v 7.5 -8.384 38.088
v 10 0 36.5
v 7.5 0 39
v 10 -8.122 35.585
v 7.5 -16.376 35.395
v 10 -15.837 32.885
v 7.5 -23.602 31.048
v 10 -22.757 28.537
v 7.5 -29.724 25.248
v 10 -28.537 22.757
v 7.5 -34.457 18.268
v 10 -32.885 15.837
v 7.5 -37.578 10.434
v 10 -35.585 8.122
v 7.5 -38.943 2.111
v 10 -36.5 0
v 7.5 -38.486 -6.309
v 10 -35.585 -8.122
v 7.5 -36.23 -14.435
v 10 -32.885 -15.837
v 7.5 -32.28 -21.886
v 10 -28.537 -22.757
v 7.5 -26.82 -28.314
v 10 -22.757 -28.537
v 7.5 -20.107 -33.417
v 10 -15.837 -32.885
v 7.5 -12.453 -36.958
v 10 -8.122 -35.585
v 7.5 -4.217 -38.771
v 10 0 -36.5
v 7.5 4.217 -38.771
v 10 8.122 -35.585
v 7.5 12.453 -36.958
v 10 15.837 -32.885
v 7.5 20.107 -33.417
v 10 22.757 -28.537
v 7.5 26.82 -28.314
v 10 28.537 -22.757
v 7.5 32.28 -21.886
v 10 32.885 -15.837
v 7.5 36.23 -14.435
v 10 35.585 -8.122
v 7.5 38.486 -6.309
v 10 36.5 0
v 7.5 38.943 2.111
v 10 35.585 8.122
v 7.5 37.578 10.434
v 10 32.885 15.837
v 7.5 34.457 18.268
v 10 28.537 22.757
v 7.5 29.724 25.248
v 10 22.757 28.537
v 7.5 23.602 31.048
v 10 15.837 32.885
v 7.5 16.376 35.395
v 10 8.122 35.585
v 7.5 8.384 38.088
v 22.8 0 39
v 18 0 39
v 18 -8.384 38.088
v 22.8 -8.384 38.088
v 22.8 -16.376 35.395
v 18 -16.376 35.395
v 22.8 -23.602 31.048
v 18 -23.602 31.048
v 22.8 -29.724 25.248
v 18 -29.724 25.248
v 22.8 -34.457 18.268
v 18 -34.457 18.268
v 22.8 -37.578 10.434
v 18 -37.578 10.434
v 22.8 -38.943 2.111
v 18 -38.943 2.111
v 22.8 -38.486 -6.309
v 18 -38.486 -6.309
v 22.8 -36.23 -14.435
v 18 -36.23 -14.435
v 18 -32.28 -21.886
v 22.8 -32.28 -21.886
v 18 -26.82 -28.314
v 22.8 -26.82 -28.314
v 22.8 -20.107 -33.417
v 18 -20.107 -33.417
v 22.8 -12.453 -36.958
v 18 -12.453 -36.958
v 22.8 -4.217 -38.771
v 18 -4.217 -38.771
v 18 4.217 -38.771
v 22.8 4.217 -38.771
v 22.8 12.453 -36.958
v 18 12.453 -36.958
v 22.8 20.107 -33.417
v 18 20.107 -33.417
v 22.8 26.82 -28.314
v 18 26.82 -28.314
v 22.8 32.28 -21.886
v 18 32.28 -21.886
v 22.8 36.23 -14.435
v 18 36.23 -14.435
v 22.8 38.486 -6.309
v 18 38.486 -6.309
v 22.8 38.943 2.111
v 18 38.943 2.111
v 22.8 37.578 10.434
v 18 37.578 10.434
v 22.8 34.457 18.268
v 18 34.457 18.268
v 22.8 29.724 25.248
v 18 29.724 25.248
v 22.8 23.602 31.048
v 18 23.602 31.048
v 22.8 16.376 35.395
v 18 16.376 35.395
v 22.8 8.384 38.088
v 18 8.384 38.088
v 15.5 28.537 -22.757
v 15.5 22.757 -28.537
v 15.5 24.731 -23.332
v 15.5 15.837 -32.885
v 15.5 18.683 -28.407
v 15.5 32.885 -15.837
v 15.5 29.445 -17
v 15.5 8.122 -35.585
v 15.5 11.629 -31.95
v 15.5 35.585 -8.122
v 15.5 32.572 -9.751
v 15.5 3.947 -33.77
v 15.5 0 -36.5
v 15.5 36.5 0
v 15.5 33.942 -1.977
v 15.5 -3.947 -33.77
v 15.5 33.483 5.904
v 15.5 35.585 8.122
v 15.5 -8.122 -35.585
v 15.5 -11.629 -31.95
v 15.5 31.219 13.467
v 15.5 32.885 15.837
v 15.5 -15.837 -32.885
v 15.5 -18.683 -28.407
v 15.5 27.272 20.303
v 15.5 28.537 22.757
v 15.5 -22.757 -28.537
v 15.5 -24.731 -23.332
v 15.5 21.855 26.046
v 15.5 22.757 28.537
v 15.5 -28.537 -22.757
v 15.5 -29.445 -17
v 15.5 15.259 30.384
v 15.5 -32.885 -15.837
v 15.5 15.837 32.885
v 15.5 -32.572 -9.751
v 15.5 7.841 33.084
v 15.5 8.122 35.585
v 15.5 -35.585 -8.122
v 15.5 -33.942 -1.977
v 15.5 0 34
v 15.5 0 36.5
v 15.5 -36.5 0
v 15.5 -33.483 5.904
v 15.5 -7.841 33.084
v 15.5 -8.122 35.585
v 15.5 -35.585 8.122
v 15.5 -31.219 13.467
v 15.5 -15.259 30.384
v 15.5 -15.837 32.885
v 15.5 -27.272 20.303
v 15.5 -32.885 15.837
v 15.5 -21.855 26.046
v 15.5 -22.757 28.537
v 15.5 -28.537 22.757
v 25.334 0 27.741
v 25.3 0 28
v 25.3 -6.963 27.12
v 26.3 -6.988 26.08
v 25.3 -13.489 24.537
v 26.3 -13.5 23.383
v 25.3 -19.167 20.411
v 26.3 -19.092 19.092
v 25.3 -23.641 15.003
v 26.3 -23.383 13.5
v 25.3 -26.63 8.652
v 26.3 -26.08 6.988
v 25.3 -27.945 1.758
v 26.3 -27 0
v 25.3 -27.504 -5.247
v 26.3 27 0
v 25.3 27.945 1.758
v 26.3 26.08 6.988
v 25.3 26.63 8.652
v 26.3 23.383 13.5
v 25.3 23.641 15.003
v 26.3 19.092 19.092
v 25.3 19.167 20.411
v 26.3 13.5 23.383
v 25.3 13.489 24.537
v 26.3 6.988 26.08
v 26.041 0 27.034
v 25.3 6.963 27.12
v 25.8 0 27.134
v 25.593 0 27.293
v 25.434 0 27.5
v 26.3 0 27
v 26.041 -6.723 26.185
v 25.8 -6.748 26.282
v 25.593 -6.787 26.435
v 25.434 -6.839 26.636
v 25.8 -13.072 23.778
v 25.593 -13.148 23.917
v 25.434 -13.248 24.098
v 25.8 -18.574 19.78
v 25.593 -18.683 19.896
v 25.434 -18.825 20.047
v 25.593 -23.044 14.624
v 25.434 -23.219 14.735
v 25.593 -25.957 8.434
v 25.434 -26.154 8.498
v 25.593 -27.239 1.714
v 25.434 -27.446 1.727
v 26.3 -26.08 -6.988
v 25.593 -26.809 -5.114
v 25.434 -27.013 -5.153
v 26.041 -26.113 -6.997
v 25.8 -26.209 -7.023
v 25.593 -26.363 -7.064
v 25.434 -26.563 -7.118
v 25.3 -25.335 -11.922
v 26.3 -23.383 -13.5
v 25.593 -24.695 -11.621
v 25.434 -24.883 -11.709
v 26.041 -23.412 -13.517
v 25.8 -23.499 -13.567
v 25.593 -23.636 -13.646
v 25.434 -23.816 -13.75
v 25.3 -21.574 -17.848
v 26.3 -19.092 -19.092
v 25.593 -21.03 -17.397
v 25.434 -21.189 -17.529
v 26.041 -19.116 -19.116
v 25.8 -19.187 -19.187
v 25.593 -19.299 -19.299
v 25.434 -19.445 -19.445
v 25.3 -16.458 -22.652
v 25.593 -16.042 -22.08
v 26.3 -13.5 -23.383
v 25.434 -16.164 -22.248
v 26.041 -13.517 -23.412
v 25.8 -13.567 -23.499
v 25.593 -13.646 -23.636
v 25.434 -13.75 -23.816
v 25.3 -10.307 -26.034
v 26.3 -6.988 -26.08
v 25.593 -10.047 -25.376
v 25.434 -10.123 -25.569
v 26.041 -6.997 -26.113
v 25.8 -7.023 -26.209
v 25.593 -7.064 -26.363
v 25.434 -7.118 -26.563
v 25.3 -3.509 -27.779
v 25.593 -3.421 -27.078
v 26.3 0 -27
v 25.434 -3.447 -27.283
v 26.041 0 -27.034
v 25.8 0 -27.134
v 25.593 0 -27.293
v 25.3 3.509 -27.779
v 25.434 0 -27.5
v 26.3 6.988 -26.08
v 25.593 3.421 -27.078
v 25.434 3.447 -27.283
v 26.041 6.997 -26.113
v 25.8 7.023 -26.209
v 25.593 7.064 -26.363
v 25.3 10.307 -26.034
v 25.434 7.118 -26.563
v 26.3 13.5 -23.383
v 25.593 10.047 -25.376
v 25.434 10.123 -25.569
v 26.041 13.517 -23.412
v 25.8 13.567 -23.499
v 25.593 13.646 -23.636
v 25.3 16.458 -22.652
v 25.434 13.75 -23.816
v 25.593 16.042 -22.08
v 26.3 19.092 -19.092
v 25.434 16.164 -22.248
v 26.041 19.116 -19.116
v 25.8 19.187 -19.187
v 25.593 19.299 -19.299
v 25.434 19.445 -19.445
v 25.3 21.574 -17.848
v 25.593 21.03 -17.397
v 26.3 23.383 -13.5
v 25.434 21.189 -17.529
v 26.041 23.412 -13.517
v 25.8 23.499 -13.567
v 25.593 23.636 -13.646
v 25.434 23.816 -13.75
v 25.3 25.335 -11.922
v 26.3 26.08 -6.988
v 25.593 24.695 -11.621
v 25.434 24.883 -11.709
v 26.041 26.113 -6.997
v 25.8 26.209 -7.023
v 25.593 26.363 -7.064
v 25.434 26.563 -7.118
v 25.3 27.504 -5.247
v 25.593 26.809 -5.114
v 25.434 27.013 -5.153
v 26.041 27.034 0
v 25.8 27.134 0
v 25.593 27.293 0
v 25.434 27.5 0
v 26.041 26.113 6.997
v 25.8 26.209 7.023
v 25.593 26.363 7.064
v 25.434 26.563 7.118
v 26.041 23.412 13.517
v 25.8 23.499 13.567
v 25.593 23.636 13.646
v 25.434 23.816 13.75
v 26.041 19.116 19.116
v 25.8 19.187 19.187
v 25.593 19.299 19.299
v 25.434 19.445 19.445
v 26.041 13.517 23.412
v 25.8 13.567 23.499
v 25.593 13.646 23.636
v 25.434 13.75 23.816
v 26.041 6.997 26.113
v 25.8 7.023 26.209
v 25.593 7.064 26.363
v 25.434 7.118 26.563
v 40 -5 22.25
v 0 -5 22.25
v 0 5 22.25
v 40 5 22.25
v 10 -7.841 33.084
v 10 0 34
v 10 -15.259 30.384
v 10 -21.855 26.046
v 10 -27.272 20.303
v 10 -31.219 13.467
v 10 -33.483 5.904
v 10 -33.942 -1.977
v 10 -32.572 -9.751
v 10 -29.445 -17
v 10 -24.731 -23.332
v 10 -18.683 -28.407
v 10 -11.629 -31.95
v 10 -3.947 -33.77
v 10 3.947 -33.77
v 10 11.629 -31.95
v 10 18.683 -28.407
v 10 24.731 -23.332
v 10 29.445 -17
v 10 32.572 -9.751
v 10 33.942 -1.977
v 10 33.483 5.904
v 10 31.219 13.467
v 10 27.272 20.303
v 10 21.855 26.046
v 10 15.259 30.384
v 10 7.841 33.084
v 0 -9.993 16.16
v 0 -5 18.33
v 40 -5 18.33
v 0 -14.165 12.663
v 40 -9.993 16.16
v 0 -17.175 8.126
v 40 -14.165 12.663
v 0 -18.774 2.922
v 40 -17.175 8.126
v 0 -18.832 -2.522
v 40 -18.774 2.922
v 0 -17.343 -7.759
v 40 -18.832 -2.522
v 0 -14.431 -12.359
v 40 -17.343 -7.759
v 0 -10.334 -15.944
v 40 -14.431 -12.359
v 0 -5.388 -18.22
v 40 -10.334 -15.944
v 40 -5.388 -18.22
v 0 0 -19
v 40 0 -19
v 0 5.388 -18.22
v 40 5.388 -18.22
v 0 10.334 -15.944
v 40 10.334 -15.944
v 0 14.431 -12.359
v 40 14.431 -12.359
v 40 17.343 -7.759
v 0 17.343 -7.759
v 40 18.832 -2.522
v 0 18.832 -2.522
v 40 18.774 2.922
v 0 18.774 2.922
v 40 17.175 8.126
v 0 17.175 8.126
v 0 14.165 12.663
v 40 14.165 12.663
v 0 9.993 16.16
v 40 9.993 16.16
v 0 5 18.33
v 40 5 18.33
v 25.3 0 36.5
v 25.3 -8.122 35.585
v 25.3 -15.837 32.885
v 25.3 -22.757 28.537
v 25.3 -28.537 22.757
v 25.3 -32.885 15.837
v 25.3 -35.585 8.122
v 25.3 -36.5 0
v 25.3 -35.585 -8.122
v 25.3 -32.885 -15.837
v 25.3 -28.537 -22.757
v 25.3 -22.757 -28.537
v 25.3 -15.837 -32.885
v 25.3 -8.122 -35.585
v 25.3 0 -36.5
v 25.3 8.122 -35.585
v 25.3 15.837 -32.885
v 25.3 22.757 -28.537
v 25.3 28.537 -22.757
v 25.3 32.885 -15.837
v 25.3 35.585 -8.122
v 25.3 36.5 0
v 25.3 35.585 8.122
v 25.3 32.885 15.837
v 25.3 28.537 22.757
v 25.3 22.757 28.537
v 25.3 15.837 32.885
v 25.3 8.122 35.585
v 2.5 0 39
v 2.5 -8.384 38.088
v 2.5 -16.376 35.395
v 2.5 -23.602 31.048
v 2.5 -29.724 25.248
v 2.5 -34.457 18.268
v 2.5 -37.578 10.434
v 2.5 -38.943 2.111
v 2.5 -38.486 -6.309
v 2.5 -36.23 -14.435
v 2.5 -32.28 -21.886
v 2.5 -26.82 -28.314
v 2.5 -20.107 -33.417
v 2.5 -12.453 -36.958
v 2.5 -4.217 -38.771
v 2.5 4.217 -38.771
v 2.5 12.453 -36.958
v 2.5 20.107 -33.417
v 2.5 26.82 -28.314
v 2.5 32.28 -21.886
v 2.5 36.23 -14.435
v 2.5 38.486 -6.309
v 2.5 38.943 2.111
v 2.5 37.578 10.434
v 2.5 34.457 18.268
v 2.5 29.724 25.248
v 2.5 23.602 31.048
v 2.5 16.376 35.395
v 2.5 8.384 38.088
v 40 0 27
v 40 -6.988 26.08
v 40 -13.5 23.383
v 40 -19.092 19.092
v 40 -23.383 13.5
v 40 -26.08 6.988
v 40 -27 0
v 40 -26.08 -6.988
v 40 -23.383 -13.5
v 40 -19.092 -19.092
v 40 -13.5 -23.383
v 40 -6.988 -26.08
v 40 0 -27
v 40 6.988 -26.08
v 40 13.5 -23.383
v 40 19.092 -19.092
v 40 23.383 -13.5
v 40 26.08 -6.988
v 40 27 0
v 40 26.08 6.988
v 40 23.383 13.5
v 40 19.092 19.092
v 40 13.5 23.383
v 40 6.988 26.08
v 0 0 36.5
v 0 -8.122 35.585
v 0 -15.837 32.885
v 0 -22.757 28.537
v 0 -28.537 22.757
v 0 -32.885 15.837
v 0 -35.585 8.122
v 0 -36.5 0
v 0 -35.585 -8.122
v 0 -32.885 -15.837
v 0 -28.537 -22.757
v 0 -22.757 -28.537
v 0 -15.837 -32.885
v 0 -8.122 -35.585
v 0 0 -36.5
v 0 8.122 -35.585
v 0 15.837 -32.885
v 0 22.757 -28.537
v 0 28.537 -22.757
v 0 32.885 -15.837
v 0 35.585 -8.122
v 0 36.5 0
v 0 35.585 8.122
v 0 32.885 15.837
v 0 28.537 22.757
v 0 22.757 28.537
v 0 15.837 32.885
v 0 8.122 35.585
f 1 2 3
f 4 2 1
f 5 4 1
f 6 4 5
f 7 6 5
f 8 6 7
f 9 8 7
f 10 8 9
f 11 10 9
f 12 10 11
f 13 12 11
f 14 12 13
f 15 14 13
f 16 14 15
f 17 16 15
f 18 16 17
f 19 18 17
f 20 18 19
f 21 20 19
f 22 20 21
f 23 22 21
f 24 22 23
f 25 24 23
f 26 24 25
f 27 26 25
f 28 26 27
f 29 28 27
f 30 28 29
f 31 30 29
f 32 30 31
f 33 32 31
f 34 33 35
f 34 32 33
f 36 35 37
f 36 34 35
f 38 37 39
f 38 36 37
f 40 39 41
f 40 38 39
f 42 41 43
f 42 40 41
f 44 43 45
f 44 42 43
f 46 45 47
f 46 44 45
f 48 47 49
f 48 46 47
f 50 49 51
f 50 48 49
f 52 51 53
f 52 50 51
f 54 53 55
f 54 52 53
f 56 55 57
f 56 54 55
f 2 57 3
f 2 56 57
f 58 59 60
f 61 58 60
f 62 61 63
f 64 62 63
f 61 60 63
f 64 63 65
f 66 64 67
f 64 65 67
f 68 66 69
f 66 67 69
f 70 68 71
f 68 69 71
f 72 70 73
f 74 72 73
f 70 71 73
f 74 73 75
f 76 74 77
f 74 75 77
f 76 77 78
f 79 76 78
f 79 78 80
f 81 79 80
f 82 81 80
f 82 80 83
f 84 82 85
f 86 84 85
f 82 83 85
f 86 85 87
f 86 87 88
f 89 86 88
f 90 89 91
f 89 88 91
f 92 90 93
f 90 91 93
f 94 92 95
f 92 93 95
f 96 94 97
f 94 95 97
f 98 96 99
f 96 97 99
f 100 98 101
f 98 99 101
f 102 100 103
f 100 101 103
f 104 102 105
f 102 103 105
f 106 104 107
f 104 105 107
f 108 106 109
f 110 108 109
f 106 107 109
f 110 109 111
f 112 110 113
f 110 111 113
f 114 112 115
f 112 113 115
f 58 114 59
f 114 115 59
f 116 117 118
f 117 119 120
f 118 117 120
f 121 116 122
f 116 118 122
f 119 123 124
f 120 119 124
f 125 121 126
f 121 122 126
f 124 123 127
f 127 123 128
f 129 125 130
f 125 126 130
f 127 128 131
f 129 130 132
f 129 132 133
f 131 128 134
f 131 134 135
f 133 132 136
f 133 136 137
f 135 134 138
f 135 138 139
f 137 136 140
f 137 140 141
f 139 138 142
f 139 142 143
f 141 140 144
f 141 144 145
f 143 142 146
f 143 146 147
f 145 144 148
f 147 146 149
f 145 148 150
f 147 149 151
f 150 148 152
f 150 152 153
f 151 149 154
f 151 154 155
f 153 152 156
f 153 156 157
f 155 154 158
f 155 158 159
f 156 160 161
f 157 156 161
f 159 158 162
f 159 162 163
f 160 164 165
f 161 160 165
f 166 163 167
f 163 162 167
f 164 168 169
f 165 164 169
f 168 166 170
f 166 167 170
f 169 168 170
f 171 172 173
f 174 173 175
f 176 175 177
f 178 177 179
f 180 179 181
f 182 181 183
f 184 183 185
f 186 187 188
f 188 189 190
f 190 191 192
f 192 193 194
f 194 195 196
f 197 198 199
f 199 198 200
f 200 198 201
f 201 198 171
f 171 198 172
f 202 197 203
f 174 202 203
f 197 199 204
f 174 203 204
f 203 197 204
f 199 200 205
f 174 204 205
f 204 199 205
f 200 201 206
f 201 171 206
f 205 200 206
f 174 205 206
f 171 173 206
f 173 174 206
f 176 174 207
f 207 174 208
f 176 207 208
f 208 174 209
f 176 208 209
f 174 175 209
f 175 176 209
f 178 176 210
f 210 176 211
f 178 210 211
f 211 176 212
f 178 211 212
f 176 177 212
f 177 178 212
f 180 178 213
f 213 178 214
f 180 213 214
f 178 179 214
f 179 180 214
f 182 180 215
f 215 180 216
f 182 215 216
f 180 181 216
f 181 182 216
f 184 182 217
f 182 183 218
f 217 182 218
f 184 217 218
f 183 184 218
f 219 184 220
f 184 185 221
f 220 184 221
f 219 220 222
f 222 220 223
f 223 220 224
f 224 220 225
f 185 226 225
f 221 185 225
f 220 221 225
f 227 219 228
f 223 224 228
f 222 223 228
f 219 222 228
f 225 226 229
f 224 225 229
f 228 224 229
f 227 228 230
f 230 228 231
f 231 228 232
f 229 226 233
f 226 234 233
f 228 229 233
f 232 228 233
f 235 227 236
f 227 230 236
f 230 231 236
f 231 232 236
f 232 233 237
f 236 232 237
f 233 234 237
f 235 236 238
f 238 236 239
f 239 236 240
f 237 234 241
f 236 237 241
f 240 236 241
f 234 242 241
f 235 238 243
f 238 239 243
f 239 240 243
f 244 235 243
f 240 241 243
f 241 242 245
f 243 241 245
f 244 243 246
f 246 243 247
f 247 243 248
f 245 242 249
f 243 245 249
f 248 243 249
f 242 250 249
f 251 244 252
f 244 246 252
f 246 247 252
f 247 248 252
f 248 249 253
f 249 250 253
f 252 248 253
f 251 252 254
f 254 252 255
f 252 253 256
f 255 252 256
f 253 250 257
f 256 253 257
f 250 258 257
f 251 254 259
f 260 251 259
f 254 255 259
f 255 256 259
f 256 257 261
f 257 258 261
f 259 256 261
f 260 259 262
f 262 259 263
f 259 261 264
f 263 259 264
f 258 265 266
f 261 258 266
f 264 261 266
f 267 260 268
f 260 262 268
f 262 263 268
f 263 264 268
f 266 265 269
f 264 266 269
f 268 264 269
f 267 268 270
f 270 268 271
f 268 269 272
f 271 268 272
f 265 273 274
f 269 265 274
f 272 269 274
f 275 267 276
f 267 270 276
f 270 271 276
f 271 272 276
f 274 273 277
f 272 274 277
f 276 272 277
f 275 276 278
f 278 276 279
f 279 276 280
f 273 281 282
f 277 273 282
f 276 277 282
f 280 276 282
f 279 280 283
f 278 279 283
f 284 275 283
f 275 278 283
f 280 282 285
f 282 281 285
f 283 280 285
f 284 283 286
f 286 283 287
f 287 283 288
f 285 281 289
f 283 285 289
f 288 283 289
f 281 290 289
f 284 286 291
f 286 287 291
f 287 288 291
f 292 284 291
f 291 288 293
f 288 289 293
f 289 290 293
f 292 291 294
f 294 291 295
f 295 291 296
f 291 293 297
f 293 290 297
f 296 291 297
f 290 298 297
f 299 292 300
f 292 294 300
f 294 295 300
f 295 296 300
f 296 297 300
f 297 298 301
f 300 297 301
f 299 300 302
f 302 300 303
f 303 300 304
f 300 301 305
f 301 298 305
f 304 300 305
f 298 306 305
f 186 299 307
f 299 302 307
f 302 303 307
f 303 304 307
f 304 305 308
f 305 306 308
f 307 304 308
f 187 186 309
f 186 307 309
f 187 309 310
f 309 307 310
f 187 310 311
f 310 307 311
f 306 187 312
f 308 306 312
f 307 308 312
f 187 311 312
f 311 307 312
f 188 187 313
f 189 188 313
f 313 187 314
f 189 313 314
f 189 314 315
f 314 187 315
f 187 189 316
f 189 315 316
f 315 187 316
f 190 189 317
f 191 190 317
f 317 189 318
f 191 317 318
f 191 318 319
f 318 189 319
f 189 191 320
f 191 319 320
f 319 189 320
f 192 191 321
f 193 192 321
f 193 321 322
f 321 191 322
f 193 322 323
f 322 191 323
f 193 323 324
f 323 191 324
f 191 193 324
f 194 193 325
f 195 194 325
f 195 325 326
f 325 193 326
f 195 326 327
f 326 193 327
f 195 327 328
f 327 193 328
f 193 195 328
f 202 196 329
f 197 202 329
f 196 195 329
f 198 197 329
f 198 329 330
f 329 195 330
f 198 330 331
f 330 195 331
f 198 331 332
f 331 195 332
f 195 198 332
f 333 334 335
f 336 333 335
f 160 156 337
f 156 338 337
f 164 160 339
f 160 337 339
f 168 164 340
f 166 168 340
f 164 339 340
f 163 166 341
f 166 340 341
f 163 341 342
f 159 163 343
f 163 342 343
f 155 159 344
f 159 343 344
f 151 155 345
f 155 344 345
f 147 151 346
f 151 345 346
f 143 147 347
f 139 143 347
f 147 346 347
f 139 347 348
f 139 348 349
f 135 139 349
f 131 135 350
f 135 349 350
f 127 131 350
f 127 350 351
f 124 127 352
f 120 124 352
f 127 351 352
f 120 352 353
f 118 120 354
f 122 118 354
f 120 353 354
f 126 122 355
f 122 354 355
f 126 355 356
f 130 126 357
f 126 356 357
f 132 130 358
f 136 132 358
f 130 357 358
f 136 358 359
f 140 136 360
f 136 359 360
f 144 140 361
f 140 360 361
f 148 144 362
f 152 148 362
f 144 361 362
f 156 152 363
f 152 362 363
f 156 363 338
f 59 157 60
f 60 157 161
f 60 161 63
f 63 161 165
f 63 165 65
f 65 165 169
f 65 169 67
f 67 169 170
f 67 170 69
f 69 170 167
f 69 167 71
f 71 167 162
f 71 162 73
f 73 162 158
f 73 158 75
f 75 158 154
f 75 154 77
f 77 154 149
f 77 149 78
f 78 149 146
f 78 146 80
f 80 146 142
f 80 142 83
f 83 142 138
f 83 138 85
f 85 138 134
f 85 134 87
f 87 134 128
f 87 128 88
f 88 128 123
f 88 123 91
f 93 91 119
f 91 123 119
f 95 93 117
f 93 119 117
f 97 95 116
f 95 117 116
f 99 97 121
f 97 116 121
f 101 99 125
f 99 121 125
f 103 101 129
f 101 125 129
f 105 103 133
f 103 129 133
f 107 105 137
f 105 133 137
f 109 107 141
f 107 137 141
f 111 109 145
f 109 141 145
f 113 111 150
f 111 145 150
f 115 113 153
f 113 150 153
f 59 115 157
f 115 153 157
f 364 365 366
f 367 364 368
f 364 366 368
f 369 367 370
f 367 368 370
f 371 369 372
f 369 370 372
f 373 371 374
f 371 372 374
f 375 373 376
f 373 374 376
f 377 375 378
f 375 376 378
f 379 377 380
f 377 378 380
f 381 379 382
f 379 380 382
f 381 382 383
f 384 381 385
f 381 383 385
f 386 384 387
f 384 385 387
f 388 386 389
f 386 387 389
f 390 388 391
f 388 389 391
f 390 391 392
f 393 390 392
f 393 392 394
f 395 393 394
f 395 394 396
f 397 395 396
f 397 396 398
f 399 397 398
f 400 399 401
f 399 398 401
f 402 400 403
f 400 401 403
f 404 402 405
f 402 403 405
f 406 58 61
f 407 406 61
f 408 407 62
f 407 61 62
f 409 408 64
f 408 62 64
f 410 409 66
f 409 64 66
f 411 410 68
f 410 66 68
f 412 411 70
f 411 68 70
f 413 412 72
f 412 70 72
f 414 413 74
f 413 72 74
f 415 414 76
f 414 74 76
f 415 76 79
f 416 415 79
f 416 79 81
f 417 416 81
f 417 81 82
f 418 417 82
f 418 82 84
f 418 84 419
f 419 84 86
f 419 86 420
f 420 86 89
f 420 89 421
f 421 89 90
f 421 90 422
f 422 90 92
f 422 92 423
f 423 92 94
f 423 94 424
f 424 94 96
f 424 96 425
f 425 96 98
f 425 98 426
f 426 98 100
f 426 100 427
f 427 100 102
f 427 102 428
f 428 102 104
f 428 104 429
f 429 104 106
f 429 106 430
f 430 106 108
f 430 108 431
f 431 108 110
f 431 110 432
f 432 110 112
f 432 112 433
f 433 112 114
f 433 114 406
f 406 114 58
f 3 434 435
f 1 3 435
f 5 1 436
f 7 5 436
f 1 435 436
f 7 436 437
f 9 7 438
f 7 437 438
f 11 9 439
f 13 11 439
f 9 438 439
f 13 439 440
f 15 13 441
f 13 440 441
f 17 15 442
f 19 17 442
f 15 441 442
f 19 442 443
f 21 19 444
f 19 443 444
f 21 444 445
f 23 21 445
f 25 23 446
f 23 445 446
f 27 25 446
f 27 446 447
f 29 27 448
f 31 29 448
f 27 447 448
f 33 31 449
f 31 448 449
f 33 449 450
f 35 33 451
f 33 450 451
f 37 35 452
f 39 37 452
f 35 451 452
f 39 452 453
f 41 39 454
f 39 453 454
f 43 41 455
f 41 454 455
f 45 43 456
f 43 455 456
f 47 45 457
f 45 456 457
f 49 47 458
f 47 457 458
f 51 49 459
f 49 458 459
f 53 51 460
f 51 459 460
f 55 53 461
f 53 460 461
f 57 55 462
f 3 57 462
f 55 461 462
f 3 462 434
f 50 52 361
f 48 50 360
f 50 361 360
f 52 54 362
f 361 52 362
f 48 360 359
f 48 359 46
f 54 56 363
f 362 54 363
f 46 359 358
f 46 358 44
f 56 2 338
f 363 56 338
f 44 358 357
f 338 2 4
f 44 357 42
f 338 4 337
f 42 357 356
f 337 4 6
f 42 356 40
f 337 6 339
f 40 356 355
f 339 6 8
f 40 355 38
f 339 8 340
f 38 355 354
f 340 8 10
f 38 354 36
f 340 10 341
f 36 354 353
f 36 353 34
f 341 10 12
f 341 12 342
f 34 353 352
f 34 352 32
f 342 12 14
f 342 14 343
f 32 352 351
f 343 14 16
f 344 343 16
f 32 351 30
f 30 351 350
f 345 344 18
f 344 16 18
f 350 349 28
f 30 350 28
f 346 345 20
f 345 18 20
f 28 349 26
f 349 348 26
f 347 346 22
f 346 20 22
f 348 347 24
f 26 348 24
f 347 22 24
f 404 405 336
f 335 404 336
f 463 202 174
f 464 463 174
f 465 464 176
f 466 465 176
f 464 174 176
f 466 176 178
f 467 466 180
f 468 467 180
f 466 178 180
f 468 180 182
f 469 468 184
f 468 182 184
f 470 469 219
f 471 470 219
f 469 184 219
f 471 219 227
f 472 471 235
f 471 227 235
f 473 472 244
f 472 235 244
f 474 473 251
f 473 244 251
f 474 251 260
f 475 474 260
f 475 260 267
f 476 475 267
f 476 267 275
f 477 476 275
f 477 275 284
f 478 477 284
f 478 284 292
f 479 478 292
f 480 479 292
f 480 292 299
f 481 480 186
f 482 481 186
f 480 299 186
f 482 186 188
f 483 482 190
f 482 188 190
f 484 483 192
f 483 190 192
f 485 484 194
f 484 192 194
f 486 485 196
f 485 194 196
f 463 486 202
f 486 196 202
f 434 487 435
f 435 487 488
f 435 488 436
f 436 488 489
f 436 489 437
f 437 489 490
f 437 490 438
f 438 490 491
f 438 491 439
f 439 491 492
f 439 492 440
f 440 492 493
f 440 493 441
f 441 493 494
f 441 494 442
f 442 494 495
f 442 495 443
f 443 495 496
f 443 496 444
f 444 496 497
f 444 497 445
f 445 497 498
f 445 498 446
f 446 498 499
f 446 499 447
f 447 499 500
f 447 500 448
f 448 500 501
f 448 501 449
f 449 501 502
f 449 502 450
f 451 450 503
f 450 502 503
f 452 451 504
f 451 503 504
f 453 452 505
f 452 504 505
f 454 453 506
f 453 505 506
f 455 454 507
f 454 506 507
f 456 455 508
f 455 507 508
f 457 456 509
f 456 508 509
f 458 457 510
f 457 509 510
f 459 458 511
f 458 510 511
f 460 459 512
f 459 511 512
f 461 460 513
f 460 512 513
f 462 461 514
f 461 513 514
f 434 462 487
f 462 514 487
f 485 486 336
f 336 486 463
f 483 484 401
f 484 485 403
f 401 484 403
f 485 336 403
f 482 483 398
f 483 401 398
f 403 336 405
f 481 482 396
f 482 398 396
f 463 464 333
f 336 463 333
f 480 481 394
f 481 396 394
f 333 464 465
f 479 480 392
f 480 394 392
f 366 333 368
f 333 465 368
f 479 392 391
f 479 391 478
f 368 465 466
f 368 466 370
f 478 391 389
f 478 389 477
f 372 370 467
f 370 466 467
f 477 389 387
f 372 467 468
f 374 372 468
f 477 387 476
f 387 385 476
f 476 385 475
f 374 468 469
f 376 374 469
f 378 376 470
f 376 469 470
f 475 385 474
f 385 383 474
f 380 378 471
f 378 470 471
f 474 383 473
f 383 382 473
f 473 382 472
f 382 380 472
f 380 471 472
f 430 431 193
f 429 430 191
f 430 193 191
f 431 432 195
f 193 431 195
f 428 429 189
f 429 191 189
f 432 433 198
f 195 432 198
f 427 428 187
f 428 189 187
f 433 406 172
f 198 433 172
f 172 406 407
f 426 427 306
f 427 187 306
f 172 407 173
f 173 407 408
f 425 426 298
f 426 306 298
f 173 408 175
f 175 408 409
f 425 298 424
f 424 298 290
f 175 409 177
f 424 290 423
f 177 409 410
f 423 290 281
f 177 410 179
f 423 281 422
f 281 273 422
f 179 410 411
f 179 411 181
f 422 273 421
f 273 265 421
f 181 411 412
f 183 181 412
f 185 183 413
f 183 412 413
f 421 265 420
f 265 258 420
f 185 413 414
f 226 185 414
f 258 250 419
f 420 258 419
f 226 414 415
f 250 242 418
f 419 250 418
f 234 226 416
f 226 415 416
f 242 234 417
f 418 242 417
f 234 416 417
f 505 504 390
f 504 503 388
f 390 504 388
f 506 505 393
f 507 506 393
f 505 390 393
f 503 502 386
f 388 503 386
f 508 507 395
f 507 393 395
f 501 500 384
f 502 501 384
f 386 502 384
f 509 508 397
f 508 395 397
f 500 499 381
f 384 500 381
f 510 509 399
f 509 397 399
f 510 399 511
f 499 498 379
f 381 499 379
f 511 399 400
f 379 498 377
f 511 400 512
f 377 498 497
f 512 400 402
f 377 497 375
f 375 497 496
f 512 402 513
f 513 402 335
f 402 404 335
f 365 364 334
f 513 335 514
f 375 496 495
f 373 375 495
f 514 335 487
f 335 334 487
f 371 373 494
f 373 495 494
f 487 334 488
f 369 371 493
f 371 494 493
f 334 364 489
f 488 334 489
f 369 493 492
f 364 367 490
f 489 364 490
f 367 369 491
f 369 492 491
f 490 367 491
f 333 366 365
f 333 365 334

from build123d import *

# Parameters (mm, degrees)
F2_SIZE  = 2.5
F3_W     = 10
F3_H     = 9
F4_DEPTH = 40.001
F5_R     = 1


with BuildPart() as f1:
    # F0 (on Front) → F1 (revolve)
    with BuildSketch(Plane.XZ):
        Polygon((10, 39), (0, 39), (0, 19), (40, 19), (40, 27), (25.3, 27), (25.3, 39), (15.5, 39), (15.5, 34), (10, 34), align=None)
    revolve(axis=Axis((29.337285, 0, 0), (1, 0, 0)))

    # F2
    f2_edges = [f1.edges().sort_by_distance(p)[0] for p in [
        (0, 0, -39),
        (10, 0, -39),
        (15.5, 0, -39),
        (25.3, 0, -39),
    ]]
    chamfer(f2_edges, length=F2_SIZE)

    # F3 (on Right) → F4 (cut, through all)
    with BuildSketch(Plane.YZ):
        with Locations((0, 17.75)):
            Rectangle(F3_W, F3_H)
    extrude(amount=F4_DEPTH, mode=Mode.SUBTRACT)

    # F5
    f5_edges = [f1.edges().sort_by_distance(p)[0] for p in [
        (25.3, 0, -27),
    ]]
    fillet(f5_edges, radius=F5_R)


solid = f1.part
